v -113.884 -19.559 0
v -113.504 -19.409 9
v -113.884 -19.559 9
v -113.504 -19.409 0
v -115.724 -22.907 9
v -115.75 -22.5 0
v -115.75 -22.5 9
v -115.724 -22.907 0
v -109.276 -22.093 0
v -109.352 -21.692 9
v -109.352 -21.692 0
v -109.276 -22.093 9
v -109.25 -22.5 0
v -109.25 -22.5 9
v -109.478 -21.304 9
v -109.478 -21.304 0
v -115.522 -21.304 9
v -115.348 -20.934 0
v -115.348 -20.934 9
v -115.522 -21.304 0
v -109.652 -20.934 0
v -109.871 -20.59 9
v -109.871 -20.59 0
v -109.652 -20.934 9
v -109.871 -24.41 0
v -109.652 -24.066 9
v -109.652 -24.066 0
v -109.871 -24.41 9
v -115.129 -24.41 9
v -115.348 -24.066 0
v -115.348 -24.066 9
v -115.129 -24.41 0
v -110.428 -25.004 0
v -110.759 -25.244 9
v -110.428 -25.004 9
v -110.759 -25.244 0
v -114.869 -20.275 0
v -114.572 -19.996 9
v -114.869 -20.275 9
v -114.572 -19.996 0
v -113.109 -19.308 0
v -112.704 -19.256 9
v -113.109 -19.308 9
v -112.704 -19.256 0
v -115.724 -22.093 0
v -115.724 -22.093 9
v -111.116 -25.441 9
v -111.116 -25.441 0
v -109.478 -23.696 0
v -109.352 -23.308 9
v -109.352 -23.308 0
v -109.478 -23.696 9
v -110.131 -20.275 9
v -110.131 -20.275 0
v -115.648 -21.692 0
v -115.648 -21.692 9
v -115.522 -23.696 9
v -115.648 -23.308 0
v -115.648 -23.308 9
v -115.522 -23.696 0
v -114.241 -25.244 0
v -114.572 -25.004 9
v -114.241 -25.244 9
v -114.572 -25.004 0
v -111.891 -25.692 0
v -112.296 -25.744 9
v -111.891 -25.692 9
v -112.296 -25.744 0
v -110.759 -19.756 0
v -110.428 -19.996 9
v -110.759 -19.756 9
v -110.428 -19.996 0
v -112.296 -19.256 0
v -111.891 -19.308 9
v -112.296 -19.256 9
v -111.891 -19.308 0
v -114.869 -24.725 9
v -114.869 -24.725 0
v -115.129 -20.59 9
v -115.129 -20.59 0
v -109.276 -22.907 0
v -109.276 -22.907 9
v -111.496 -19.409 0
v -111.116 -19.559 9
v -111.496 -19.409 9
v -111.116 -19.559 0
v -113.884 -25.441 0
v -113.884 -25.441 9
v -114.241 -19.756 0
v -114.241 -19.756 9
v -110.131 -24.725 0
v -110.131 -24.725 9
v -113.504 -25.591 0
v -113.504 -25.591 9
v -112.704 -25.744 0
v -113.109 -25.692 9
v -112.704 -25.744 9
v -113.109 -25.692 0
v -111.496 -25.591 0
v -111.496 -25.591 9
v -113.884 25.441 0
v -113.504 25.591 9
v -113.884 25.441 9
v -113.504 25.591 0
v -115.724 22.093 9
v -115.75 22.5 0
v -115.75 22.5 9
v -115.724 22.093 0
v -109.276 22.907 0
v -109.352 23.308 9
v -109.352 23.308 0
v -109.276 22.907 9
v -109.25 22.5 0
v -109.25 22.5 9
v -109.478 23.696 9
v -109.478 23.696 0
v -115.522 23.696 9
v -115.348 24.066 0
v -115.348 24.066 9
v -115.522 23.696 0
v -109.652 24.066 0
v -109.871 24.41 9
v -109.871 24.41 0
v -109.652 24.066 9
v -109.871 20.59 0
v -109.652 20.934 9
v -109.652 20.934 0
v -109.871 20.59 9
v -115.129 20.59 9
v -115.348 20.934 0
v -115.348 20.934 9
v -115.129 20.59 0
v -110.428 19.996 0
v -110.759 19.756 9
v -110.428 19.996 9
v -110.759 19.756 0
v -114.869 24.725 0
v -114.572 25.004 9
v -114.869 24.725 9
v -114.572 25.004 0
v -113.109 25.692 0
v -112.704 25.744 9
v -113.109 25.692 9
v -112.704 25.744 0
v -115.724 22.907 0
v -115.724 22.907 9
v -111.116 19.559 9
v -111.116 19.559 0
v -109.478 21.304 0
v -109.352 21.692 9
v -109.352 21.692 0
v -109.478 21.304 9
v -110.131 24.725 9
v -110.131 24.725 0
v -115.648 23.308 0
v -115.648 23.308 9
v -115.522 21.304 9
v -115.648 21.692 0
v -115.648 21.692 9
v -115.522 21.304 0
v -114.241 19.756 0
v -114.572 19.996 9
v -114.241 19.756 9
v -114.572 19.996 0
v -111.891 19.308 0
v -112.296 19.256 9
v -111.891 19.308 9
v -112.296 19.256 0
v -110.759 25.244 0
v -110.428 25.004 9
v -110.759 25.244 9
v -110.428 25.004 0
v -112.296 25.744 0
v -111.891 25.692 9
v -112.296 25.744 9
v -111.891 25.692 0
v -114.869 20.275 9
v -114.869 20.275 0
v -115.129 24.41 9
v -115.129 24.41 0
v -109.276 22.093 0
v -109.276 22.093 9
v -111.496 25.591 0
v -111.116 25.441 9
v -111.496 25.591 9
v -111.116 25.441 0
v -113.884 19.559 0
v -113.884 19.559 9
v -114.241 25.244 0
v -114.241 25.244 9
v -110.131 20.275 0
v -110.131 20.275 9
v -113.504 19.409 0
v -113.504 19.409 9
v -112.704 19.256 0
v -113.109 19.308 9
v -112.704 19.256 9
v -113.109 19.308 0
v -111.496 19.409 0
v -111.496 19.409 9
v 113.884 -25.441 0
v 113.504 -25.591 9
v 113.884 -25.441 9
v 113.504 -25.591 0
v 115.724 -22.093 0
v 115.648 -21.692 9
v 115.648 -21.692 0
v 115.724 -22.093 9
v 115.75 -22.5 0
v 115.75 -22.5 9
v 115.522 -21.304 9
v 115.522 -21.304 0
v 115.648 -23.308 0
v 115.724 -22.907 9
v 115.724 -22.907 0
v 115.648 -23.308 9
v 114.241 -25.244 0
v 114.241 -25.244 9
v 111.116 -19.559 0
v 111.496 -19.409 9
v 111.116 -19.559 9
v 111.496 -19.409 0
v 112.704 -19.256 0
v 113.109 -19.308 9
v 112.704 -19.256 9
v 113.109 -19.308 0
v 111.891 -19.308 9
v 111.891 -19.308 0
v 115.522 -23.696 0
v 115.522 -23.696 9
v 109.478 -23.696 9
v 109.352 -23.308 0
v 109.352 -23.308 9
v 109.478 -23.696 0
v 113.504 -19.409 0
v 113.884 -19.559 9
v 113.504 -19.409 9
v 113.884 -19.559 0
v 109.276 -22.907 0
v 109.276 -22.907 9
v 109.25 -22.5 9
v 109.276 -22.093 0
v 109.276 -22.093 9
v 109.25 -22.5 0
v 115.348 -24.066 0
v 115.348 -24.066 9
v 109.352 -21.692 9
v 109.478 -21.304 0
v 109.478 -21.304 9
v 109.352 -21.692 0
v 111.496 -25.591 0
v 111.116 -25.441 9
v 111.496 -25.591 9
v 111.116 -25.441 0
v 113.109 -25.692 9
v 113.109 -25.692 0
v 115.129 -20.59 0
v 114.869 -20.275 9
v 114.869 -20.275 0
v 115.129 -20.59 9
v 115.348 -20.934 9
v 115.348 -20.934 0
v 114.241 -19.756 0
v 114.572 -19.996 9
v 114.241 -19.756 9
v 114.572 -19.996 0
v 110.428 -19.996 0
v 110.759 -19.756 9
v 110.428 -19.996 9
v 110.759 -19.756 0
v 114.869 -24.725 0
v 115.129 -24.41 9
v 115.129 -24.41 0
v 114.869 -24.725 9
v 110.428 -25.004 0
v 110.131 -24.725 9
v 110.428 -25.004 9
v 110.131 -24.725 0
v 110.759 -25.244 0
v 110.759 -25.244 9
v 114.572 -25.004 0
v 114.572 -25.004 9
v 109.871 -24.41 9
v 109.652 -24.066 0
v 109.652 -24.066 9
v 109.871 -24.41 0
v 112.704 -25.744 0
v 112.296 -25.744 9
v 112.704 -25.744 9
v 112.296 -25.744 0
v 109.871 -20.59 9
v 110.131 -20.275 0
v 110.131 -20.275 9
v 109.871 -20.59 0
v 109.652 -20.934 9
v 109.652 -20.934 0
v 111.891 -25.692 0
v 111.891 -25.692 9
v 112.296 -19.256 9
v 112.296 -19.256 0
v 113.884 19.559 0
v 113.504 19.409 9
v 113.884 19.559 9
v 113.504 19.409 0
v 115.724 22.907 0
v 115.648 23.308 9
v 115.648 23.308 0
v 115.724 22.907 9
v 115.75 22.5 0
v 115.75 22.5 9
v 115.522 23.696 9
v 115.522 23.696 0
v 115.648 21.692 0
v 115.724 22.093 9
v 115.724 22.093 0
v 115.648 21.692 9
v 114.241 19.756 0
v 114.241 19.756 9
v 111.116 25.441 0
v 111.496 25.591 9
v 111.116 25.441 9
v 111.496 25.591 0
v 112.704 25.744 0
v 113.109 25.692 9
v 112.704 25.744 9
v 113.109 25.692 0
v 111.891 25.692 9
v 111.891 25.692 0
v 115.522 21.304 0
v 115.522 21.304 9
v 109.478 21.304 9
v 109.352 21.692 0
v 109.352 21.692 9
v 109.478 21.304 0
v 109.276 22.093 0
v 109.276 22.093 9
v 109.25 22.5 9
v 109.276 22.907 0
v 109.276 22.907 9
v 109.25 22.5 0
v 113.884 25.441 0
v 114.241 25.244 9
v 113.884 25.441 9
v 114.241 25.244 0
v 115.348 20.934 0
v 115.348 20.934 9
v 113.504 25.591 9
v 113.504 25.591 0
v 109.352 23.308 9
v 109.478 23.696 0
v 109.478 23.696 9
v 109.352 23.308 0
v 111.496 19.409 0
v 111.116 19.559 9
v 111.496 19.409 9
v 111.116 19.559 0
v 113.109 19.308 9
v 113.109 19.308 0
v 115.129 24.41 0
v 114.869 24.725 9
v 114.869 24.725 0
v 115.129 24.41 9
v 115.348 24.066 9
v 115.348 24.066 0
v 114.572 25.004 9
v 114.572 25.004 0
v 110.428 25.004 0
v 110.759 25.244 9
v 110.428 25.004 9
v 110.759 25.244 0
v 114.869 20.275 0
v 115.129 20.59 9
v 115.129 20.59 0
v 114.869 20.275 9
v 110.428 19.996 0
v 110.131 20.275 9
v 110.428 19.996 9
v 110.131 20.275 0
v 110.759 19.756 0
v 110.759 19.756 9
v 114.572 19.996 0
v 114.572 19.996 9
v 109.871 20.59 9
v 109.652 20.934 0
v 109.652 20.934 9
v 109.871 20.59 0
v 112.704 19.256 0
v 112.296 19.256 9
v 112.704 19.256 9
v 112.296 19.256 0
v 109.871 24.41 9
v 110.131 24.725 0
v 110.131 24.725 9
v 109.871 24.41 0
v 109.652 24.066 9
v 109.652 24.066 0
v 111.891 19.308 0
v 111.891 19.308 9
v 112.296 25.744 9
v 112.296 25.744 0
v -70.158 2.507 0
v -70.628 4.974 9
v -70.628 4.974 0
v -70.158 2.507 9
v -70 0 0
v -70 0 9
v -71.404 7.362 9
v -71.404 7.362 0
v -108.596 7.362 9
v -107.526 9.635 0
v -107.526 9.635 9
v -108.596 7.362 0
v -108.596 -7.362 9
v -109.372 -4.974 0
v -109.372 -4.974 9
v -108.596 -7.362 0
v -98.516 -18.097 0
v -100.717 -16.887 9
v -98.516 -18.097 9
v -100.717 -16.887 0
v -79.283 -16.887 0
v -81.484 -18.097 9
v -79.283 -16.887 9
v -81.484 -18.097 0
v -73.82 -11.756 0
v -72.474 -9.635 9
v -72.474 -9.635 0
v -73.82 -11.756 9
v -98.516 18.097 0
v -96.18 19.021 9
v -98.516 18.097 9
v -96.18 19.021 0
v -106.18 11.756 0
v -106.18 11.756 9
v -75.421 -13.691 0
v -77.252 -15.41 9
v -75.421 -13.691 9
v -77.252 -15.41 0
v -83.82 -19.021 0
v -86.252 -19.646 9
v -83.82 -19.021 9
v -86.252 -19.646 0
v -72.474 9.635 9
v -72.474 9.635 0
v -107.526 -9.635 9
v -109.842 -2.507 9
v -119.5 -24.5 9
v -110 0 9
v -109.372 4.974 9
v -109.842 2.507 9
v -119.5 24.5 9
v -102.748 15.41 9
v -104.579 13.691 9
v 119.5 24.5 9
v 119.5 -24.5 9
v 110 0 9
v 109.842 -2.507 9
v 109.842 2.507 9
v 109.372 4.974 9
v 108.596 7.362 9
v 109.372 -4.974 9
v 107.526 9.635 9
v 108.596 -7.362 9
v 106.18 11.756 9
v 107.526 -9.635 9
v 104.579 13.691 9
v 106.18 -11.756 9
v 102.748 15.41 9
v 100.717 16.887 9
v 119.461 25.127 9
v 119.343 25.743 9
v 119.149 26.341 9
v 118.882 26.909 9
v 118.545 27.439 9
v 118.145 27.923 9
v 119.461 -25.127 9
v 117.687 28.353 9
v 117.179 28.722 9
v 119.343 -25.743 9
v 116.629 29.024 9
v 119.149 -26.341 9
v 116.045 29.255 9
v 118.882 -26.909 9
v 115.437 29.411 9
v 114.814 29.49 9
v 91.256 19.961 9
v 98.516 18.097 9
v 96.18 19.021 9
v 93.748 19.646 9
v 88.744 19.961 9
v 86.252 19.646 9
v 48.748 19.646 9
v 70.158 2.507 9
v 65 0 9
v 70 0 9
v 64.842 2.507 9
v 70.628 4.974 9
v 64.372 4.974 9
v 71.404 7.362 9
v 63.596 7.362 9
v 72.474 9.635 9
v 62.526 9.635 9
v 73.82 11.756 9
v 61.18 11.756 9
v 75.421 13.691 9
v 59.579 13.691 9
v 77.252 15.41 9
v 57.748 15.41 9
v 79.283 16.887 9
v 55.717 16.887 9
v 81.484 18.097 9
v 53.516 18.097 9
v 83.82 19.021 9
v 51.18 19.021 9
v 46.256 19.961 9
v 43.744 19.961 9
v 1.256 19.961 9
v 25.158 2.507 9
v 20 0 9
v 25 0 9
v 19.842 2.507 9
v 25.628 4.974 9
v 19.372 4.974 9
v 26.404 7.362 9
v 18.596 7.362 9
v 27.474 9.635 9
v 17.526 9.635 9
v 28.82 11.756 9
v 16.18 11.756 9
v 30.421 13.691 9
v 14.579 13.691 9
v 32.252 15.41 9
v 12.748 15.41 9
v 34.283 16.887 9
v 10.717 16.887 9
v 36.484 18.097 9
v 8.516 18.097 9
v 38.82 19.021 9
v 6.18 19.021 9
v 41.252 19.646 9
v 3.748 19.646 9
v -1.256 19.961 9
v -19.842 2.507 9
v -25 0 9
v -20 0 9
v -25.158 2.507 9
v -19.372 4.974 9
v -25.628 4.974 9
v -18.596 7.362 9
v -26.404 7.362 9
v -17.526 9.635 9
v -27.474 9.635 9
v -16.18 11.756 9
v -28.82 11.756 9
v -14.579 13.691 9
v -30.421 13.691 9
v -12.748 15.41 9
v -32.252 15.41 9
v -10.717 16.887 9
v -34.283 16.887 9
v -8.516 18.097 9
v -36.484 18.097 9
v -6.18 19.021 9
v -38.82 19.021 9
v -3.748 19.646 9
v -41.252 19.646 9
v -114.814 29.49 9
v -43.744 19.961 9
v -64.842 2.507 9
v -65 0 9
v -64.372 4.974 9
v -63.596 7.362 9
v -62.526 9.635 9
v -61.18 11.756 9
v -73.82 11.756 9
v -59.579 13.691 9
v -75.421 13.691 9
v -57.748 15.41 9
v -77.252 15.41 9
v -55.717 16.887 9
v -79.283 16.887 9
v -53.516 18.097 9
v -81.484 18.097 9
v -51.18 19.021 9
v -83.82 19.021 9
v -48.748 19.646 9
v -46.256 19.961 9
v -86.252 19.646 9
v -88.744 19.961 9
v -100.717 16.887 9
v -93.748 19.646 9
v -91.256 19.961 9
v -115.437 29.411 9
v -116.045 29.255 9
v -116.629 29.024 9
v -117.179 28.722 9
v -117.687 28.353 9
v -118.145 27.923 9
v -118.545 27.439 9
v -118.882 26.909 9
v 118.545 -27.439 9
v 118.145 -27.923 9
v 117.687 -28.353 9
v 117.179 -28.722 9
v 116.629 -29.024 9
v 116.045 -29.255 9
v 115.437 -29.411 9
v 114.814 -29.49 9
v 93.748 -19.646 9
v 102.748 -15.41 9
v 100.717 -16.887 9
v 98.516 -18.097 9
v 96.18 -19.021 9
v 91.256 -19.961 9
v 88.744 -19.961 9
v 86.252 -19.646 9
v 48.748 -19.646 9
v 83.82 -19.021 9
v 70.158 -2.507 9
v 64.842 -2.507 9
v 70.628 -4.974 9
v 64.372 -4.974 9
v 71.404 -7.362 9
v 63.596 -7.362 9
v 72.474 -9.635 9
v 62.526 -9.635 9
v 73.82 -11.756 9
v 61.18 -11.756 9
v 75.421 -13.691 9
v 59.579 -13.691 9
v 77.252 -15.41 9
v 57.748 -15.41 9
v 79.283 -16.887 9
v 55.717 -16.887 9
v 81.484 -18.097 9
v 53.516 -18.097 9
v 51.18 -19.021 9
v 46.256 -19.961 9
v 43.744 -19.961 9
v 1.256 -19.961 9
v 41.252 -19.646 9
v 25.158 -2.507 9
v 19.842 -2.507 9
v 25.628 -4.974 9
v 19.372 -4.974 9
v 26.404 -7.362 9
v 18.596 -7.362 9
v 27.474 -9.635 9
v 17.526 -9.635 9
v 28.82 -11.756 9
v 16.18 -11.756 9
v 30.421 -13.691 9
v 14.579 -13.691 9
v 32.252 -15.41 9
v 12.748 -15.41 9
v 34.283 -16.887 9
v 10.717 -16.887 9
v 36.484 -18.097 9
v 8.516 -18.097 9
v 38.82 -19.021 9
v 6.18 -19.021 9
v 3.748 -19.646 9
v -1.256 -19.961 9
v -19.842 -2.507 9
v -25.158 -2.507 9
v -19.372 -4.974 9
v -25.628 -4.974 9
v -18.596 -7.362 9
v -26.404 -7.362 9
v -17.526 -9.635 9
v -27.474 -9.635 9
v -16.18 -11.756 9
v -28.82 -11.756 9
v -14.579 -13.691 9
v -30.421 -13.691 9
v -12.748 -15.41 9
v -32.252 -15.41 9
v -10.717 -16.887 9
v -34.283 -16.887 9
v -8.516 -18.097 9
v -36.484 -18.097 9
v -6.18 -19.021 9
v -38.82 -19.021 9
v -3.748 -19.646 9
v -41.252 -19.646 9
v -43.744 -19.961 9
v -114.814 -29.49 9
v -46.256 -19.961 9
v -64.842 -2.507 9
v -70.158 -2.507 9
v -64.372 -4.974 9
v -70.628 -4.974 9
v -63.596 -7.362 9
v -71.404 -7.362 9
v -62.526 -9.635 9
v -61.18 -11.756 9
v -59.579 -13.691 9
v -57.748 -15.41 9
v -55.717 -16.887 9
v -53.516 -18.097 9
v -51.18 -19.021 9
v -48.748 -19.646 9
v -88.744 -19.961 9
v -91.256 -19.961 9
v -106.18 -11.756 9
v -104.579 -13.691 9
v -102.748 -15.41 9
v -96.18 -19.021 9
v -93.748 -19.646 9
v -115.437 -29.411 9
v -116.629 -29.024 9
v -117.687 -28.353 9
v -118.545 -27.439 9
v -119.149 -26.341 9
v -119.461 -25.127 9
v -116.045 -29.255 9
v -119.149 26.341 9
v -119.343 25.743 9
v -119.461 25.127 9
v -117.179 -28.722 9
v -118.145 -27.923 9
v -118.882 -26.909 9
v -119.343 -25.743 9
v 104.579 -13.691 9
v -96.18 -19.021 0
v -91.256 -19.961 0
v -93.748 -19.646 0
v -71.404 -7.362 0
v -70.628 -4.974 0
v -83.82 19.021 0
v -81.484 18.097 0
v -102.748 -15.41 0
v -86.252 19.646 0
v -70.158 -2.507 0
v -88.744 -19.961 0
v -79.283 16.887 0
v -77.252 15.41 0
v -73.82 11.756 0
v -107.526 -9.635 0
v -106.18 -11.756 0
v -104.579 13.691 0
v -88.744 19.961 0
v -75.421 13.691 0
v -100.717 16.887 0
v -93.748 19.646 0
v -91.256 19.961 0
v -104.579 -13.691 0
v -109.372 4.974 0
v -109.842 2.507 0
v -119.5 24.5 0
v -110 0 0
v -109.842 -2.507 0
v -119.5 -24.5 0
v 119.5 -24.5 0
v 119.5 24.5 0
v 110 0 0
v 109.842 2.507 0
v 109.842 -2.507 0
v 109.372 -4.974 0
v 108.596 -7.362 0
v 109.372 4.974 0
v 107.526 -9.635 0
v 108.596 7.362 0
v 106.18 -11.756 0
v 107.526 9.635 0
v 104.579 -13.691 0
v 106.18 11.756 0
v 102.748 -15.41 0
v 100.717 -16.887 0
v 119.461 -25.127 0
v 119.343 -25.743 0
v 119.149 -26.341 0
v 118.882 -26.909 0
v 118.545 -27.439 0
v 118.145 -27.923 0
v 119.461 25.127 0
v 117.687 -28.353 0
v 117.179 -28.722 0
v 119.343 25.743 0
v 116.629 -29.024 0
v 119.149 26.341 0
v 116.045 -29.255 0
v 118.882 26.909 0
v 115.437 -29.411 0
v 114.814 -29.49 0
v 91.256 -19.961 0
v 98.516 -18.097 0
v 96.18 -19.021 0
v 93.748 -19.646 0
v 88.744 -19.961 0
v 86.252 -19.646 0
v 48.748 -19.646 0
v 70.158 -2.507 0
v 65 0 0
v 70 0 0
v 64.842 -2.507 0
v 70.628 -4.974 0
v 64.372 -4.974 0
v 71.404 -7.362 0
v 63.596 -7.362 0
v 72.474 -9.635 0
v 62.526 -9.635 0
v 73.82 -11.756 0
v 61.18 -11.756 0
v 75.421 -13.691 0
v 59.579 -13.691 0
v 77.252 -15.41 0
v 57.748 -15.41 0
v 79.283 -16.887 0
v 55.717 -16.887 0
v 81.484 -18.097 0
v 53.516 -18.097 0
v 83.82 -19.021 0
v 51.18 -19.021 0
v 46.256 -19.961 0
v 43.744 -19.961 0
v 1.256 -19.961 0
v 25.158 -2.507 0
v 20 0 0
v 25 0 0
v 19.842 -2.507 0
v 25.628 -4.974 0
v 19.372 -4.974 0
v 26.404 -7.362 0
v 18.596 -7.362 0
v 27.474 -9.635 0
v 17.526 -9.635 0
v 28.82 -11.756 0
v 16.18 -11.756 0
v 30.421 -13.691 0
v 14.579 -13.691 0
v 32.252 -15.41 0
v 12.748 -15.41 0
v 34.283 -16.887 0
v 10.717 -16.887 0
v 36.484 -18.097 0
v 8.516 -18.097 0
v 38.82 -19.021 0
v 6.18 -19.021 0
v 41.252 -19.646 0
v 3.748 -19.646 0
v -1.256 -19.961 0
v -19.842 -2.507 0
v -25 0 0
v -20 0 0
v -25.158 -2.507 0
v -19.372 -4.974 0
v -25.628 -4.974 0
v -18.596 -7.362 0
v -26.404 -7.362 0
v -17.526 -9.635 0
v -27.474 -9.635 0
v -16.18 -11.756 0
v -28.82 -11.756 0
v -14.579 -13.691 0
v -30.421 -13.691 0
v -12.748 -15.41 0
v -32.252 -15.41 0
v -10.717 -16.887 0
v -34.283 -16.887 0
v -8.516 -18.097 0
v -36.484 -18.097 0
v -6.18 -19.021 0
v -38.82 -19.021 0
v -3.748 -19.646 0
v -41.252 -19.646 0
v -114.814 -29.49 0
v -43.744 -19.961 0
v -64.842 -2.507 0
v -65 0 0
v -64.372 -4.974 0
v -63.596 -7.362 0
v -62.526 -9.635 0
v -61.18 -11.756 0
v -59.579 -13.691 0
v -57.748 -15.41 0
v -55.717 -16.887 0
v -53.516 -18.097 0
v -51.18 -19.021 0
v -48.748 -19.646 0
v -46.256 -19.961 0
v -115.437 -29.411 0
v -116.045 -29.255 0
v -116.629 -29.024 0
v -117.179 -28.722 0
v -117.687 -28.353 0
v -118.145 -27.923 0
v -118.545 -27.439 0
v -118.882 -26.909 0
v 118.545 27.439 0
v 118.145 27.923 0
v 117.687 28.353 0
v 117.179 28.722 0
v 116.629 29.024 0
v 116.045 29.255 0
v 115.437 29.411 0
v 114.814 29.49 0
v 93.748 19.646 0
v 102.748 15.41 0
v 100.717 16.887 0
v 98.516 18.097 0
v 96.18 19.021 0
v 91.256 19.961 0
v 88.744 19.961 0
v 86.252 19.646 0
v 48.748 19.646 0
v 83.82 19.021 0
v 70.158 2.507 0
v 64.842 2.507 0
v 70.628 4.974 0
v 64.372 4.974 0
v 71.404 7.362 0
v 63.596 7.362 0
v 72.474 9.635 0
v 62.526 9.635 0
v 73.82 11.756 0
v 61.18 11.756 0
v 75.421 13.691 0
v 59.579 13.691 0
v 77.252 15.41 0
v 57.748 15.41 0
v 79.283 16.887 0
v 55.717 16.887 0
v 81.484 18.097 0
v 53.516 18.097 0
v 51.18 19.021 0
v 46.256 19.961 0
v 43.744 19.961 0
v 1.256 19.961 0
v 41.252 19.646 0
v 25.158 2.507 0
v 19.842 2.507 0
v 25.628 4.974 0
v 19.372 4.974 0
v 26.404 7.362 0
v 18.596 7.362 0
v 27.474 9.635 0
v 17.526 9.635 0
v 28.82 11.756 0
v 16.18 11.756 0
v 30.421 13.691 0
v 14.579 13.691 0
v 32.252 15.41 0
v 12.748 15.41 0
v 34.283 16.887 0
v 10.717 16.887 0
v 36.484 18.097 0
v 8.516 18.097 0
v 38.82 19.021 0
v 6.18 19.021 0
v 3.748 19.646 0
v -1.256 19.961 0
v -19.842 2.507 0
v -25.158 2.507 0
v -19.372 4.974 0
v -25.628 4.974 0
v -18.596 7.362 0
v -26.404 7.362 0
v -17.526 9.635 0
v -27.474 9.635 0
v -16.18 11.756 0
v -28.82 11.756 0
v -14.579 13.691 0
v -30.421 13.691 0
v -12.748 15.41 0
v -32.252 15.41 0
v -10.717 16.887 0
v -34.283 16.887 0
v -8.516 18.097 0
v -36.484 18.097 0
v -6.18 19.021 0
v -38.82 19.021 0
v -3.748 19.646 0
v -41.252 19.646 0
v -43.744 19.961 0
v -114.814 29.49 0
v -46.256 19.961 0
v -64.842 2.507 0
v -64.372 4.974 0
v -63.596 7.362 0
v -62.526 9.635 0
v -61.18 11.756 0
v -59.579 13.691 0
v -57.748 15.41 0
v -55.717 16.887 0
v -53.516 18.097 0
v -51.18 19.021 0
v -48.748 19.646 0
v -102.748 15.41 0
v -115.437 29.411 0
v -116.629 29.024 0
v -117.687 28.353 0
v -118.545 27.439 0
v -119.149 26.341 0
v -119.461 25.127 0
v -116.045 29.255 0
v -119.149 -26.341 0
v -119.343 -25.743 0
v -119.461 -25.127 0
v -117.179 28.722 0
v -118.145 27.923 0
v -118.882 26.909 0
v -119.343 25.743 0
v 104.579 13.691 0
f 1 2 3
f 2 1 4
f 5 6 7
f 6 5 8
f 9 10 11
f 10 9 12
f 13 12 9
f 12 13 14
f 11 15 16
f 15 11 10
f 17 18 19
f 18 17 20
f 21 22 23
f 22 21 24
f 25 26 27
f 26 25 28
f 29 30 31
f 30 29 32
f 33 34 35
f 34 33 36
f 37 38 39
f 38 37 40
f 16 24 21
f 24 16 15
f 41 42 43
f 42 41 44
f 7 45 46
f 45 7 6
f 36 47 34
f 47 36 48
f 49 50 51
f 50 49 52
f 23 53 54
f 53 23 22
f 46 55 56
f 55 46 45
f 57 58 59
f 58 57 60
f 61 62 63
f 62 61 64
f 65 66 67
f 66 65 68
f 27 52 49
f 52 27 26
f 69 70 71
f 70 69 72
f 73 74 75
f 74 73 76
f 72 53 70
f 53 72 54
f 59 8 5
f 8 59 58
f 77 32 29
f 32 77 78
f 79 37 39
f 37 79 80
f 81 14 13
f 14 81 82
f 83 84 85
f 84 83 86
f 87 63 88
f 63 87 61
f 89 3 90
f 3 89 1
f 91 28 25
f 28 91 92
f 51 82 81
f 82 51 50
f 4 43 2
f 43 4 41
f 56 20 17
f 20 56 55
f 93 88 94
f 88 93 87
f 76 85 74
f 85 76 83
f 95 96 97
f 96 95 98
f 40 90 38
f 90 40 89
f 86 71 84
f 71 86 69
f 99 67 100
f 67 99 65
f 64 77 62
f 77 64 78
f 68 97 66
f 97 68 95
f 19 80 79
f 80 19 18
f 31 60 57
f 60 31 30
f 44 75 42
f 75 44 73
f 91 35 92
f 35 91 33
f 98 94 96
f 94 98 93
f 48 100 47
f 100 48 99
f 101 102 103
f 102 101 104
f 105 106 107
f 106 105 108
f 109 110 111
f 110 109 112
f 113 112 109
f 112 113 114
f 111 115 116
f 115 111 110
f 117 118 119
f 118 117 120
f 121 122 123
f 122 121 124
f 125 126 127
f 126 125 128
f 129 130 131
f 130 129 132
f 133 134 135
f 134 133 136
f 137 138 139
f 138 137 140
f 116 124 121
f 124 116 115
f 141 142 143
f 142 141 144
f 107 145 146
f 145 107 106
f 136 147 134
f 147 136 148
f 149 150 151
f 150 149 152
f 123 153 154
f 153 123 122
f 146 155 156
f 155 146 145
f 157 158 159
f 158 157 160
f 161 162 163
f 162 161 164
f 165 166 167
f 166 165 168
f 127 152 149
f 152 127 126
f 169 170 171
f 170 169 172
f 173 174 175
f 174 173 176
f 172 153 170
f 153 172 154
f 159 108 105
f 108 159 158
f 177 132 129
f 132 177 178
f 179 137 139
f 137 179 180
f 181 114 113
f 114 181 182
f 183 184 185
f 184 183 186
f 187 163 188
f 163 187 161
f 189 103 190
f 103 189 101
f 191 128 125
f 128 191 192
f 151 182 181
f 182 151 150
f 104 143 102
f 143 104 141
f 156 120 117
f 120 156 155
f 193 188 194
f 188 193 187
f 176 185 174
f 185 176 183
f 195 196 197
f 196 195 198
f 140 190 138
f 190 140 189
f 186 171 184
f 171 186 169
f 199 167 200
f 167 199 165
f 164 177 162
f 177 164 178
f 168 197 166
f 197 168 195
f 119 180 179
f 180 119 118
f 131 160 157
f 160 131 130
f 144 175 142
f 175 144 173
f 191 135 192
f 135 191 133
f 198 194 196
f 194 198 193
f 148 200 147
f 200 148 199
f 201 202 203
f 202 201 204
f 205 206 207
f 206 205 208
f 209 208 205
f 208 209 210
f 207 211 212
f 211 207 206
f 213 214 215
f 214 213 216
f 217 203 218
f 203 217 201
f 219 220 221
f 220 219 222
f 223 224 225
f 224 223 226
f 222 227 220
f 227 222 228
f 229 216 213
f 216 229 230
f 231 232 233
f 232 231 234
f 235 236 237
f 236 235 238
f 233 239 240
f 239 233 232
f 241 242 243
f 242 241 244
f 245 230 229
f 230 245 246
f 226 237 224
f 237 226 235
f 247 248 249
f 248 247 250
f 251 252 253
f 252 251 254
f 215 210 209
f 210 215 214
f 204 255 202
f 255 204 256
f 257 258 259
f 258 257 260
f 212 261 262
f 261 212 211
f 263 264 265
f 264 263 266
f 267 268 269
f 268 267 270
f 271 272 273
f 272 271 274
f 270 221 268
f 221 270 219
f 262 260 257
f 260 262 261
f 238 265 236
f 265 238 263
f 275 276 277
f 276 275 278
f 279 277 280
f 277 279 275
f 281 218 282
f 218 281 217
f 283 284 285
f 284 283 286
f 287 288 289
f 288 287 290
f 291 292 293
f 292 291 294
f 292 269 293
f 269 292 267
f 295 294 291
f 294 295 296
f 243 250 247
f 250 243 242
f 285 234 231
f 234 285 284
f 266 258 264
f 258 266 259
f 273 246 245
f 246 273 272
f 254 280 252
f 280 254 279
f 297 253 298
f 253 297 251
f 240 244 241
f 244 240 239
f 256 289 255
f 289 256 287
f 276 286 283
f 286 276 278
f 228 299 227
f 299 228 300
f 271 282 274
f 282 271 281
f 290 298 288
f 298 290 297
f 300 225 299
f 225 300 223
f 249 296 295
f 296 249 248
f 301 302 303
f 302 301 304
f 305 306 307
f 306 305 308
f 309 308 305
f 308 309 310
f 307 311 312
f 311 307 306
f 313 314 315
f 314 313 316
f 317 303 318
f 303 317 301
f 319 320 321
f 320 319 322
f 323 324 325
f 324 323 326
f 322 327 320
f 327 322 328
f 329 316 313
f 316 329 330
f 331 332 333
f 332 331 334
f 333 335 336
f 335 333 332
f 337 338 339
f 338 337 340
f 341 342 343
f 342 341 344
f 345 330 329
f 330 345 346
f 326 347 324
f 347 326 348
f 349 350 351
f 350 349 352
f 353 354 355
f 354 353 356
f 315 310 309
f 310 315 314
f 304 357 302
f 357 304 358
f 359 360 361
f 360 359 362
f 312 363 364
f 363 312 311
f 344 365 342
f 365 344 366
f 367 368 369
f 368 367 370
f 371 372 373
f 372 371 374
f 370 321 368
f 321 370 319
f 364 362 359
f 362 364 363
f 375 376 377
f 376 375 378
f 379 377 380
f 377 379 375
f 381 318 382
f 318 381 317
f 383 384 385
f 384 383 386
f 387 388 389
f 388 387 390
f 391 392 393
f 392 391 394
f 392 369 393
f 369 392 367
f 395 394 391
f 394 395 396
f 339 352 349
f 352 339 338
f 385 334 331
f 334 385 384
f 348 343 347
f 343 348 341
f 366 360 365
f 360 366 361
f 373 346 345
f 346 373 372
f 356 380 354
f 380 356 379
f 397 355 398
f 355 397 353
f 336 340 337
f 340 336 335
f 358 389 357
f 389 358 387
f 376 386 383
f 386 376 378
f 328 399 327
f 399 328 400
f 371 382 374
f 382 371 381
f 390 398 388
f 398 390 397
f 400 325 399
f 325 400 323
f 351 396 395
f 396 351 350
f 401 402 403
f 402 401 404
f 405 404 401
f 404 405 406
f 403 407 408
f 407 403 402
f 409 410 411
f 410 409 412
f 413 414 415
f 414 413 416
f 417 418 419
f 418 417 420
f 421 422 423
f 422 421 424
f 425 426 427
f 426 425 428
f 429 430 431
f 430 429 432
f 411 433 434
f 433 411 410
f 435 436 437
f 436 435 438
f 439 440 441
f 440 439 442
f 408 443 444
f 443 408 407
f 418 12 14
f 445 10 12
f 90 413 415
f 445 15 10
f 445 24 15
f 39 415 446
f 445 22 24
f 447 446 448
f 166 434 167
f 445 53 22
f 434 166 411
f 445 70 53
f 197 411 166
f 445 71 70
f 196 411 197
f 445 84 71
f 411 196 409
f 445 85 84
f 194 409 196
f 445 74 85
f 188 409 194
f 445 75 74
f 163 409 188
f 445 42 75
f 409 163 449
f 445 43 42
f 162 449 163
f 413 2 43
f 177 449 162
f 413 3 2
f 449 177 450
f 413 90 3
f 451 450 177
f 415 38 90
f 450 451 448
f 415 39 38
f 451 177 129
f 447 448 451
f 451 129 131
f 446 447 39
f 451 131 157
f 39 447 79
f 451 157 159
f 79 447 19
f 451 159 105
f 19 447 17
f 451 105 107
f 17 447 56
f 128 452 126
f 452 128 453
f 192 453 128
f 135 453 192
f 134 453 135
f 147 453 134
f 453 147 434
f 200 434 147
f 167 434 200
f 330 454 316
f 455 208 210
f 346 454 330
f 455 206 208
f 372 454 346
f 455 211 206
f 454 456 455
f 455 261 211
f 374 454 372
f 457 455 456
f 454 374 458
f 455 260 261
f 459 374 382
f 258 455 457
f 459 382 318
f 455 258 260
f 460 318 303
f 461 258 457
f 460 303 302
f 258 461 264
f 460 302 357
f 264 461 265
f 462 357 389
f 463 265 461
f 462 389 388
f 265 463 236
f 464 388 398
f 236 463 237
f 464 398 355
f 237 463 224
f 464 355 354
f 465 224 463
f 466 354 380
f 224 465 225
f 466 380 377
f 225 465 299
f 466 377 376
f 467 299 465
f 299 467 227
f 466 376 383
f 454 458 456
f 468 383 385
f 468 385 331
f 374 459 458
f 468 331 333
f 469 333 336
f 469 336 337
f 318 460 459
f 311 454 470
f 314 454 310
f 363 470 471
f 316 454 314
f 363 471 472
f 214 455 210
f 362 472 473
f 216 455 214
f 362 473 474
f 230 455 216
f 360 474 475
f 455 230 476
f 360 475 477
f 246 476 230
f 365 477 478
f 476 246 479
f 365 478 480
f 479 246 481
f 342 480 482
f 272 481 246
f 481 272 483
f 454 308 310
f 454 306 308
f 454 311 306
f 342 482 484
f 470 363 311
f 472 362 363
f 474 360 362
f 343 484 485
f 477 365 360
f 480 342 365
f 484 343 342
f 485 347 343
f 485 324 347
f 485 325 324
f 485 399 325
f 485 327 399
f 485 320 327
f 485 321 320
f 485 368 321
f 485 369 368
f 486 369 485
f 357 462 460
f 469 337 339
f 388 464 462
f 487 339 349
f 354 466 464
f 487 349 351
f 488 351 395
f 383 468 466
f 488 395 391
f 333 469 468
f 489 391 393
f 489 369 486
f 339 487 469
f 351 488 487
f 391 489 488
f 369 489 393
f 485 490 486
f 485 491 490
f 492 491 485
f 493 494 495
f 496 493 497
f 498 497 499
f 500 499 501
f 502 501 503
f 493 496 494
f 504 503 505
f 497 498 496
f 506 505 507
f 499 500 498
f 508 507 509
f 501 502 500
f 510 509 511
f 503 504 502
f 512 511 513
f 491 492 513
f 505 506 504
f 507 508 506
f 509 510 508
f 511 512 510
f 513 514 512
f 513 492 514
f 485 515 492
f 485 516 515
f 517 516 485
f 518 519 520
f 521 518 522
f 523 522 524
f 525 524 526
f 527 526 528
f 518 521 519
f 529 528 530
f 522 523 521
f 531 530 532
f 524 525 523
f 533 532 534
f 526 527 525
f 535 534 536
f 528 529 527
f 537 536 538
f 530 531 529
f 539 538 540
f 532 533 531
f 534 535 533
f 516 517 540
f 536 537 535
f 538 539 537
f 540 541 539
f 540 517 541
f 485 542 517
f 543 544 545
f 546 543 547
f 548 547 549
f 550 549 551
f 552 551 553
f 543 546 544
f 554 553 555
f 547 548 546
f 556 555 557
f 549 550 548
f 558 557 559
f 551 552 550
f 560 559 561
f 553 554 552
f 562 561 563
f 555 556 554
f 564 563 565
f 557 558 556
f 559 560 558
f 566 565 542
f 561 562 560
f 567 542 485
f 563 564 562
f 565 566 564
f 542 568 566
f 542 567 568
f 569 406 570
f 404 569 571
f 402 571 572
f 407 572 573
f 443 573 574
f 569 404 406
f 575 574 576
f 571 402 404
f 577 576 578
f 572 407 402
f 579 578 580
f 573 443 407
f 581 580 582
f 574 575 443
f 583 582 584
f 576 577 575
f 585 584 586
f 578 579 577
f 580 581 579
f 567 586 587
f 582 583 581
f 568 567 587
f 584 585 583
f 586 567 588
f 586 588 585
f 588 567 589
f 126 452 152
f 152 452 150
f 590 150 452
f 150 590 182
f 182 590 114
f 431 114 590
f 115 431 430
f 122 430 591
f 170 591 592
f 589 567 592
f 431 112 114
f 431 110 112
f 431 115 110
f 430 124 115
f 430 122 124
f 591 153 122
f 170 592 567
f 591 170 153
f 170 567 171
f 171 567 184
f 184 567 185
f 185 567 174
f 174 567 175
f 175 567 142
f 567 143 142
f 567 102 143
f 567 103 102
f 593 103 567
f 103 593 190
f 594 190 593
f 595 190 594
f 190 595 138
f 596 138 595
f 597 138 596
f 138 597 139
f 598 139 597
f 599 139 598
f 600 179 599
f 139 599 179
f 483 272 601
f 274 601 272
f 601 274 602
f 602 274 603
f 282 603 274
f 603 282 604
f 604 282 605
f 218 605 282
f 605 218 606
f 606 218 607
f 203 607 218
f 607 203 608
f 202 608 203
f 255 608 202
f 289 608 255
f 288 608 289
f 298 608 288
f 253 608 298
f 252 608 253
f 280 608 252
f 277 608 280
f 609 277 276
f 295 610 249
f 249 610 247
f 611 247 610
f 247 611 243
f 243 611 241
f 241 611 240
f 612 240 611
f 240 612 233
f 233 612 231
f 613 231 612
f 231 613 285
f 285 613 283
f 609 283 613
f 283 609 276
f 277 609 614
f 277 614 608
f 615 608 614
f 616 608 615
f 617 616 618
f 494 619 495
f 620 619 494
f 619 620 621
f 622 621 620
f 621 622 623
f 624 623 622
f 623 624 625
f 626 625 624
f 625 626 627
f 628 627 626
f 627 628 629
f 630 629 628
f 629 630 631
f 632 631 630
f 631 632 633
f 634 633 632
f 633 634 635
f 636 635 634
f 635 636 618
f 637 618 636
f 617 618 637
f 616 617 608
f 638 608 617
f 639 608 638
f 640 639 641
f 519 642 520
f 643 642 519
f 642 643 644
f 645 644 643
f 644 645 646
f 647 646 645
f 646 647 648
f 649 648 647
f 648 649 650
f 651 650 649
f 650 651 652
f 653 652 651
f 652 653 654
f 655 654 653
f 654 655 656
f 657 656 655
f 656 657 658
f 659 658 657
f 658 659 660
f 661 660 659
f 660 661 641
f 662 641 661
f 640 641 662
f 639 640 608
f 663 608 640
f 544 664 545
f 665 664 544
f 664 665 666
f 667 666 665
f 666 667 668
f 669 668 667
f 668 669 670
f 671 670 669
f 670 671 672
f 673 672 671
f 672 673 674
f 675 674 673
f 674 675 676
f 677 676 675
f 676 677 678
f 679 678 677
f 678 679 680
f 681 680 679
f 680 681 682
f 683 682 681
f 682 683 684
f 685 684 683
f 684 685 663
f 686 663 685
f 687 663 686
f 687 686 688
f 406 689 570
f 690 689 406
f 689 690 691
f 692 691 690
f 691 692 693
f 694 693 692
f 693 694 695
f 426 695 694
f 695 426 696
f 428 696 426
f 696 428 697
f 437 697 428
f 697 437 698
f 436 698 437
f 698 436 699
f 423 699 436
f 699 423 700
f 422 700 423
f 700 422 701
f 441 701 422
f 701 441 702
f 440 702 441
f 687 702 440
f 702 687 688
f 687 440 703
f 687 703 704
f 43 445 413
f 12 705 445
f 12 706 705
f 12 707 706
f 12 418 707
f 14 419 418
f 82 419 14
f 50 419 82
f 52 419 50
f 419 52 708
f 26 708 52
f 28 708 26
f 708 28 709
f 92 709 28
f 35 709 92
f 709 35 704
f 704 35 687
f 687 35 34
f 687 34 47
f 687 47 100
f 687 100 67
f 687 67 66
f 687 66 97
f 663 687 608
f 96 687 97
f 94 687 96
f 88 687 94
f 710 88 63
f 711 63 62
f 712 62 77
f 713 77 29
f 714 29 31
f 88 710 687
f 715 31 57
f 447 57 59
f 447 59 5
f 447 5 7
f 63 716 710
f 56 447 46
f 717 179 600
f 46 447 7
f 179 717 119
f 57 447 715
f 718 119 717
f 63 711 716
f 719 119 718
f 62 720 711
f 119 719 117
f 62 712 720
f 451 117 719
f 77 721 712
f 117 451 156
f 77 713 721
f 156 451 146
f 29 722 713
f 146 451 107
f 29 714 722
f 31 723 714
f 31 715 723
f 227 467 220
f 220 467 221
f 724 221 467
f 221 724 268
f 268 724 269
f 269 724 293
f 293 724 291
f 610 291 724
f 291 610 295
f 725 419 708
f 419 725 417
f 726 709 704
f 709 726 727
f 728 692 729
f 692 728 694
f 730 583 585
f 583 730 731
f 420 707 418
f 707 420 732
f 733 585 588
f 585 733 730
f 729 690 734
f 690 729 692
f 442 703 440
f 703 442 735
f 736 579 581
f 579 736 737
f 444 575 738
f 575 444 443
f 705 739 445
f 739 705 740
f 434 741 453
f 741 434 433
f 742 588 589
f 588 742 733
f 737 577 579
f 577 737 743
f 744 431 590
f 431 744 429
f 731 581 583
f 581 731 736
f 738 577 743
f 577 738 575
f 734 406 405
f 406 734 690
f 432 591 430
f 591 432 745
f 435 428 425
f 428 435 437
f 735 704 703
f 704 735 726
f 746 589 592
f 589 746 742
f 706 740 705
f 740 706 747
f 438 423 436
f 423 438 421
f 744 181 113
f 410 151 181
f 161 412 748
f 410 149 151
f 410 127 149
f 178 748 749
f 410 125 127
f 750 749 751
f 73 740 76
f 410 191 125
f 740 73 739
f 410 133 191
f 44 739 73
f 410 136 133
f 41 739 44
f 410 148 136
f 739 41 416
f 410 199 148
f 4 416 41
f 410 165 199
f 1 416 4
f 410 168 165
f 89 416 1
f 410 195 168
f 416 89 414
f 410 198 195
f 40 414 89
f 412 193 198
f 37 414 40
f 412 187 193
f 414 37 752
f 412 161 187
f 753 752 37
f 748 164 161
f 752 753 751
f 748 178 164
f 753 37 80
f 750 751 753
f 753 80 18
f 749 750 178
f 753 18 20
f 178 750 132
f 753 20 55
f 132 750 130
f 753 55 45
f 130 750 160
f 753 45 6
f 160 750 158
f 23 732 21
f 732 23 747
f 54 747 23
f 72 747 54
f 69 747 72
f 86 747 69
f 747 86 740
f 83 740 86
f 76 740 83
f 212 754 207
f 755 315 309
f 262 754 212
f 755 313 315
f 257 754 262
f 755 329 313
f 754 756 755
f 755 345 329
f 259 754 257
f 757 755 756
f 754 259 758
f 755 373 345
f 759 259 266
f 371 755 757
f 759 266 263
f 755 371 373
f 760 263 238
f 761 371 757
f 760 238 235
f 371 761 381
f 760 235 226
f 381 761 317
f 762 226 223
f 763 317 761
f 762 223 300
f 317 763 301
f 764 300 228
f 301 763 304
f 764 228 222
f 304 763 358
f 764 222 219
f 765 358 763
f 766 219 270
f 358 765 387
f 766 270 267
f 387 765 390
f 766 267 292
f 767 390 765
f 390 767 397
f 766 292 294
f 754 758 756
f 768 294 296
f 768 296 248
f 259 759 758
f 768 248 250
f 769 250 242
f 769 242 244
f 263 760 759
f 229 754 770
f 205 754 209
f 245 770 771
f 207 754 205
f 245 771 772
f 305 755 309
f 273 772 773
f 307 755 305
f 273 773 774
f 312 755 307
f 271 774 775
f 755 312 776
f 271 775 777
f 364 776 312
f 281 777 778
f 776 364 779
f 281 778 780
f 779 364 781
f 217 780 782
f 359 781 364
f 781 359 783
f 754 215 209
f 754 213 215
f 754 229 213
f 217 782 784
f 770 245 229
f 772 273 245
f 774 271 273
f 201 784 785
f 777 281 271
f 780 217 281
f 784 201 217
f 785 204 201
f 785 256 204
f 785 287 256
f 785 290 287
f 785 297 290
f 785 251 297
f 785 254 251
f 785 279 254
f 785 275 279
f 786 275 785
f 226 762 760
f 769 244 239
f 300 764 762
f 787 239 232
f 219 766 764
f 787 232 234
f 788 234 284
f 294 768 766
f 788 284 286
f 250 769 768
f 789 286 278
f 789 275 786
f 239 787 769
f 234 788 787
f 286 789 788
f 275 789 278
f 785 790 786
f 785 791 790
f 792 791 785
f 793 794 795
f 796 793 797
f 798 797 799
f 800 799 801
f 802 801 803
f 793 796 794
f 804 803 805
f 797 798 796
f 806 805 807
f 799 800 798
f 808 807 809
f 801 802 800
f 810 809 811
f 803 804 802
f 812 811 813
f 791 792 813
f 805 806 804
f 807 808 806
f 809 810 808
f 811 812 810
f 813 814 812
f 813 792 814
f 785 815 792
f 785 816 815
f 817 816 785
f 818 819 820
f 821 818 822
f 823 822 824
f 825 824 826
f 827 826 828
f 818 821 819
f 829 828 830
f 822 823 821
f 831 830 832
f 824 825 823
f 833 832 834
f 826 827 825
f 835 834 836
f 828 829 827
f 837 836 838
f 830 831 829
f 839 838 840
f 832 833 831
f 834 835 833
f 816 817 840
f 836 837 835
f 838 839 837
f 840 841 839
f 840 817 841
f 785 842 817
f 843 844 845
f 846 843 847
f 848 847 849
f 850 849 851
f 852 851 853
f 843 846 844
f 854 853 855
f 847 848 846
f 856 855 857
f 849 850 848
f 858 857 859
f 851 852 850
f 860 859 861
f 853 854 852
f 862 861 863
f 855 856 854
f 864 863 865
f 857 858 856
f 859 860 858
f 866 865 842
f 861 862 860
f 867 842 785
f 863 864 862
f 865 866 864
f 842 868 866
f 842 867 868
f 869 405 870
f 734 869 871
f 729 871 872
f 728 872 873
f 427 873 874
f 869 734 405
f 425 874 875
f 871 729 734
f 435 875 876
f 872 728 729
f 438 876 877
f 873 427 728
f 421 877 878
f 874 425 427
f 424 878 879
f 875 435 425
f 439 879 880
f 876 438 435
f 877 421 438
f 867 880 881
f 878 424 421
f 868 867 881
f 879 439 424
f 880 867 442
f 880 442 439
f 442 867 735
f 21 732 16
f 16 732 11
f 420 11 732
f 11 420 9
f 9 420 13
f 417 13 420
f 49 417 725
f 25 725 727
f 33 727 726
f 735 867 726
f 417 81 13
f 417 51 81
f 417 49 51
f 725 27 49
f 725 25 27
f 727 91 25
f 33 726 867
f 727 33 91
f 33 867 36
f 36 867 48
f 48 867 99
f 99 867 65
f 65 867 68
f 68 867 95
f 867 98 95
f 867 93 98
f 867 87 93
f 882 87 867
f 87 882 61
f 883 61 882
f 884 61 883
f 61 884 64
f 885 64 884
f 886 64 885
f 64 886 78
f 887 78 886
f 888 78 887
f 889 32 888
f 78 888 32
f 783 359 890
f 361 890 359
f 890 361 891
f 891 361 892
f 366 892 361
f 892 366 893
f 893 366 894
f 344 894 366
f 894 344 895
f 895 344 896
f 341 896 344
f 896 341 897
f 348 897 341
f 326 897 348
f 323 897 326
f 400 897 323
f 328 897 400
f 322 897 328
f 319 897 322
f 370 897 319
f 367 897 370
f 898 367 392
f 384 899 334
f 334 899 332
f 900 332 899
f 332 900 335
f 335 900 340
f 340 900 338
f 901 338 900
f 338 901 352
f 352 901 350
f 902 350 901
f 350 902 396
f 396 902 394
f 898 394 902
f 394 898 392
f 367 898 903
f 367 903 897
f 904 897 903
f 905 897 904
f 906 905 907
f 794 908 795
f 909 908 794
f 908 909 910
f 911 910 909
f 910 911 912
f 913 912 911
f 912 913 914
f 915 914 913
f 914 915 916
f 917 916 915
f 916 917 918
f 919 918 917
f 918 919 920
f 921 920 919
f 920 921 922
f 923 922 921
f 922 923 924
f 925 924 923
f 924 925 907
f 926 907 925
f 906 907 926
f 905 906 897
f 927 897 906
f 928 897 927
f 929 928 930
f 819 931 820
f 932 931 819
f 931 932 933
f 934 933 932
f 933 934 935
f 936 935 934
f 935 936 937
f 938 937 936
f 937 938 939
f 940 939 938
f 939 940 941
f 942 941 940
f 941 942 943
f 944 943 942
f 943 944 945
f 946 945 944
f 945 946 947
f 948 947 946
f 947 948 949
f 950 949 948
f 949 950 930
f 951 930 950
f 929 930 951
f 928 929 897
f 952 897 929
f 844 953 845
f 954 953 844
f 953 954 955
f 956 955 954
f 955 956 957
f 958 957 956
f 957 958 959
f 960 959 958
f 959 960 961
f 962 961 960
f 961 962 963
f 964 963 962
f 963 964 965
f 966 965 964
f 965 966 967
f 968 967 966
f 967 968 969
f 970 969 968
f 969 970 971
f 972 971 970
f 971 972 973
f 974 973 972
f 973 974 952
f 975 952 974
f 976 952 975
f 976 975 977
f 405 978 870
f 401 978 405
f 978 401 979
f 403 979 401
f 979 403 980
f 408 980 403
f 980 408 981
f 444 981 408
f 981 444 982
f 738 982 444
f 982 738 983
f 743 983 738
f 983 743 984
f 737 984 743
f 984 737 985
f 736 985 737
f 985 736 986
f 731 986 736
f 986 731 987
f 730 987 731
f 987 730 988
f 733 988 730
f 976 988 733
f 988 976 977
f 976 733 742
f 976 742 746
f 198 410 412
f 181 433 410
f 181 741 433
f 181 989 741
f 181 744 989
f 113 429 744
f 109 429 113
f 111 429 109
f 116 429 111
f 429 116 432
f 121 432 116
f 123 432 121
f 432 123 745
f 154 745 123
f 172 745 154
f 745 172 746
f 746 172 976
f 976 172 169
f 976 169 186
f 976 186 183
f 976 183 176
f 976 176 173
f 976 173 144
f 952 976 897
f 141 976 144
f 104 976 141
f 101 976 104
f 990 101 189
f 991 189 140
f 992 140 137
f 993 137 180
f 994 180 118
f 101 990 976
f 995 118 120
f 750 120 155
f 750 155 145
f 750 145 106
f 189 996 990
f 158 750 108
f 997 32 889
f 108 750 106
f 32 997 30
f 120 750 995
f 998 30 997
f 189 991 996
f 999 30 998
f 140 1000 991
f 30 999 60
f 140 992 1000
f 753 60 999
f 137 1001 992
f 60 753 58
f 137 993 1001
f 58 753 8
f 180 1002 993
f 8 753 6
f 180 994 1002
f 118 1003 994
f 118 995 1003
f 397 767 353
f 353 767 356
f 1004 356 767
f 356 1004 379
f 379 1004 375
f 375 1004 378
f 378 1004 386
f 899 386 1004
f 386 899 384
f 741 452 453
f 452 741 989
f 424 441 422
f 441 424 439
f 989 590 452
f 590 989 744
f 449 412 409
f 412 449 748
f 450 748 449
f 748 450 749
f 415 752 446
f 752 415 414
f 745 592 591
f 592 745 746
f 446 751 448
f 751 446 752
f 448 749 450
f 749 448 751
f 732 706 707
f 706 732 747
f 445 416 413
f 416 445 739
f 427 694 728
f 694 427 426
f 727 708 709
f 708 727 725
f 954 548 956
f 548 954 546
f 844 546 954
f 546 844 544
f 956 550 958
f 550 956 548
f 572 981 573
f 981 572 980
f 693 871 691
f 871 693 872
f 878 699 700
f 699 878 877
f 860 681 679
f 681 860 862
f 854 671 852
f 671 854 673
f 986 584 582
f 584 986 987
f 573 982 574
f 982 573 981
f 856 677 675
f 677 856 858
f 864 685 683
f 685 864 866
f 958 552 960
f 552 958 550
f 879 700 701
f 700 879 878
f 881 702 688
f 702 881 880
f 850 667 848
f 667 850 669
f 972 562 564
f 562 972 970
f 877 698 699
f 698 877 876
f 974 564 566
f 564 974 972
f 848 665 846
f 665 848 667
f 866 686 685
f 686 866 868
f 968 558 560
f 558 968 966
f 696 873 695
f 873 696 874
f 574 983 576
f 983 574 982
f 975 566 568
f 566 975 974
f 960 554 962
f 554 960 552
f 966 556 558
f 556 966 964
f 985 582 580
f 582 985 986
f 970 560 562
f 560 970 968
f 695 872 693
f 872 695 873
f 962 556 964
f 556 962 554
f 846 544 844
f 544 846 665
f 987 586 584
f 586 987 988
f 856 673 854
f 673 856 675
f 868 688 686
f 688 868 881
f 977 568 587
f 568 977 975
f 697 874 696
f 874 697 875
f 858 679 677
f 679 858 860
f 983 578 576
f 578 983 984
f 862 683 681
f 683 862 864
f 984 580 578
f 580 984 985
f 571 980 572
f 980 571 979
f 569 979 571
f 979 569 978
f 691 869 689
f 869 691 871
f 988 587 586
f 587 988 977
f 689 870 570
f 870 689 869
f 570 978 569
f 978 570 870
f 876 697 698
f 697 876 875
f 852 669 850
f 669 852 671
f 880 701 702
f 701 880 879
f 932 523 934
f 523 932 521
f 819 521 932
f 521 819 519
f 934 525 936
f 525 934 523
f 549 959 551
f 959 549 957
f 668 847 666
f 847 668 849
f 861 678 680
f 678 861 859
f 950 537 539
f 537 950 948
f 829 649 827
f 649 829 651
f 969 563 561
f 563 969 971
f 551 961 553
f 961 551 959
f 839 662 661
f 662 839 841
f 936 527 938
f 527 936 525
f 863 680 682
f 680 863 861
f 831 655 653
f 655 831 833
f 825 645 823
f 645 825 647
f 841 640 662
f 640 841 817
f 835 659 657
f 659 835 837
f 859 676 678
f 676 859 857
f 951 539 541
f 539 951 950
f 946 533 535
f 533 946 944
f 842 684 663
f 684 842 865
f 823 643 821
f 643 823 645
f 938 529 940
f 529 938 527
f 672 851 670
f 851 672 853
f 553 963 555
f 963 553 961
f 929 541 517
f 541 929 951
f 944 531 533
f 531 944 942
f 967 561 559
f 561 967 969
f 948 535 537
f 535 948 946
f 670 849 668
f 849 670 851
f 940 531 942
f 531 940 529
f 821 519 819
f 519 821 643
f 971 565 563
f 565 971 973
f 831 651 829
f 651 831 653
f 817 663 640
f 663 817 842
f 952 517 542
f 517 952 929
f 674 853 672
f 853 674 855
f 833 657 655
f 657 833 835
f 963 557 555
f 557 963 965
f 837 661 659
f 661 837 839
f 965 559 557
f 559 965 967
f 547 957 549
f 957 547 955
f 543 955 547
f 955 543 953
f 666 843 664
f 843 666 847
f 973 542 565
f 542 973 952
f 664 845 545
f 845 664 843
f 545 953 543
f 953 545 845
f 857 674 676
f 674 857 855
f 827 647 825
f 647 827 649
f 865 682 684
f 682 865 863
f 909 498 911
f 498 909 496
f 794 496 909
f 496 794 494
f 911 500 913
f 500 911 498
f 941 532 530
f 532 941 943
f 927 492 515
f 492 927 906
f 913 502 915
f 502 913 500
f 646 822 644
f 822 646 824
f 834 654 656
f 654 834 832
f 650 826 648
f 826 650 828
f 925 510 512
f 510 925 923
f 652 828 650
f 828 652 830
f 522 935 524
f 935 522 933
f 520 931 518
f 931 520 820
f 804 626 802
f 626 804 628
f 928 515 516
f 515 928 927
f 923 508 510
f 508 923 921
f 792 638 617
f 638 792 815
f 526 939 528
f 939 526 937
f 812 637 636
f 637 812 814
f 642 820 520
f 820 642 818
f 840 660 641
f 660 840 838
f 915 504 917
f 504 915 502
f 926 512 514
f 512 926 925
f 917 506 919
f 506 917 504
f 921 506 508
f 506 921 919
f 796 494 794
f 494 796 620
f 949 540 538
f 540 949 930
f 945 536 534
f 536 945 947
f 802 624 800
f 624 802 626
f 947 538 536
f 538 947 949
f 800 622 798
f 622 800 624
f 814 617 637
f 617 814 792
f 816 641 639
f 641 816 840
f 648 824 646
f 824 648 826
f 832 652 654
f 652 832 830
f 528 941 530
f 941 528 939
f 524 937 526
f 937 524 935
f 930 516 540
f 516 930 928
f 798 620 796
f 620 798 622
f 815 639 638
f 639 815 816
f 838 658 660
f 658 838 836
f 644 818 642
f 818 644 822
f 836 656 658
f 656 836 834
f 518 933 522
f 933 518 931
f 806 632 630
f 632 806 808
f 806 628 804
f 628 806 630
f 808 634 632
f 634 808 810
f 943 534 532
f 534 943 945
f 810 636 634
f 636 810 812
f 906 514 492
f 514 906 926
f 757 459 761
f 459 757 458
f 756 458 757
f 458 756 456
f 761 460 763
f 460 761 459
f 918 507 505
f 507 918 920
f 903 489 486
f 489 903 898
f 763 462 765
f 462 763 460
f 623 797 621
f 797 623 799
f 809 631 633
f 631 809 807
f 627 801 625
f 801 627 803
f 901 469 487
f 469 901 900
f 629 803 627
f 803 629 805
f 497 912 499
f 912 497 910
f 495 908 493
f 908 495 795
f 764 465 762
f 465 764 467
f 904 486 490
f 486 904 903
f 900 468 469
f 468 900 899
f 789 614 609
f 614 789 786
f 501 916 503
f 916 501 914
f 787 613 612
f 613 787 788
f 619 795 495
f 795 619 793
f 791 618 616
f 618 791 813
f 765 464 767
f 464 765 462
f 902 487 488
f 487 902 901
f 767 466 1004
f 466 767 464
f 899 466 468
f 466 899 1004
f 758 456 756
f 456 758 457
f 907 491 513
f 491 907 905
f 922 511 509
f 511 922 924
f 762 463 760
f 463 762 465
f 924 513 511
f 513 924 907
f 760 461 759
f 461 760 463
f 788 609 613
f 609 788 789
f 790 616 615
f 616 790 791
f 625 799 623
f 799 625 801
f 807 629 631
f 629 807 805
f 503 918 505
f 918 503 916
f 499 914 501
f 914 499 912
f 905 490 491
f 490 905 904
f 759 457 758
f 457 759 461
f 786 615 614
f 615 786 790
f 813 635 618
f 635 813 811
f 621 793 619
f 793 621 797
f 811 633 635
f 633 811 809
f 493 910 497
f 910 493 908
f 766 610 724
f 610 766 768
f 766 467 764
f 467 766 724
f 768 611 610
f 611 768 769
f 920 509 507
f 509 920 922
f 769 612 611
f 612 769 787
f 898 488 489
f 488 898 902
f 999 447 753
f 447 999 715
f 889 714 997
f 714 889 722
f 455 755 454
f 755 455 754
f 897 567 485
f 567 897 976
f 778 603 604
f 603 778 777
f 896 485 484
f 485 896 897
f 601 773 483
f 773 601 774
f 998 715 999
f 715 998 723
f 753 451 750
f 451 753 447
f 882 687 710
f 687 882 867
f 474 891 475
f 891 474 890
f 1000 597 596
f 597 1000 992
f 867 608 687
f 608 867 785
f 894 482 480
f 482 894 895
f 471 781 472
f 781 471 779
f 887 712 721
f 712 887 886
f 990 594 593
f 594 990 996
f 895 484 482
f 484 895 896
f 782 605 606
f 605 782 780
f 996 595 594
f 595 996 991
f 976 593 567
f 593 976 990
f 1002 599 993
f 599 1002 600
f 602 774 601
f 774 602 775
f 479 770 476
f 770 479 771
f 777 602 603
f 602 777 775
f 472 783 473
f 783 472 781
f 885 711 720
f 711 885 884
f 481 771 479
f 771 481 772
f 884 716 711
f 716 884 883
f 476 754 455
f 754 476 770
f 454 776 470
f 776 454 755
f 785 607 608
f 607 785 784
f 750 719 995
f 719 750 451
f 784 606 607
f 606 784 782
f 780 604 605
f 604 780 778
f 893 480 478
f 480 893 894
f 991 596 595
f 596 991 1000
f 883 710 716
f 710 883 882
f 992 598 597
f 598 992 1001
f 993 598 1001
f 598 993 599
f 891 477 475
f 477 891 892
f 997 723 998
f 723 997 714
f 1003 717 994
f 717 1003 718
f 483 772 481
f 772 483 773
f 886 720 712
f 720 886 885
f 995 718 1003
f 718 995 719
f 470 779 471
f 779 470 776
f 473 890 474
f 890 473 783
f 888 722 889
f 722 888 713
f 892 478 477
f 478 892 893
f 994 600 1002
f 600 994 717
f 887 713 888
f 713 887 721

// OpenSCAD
$fn = 50;


difference() {
	union() {
		hull() {
			translate(v = [-114.5000000000, 24.5000000000, 0]) {
				cylinder(h = 9, r = 5);
			}
			translate(v = [114.5000000000, 24.5000000000, 0]) {
				cylinder(h = 9, r = 5);
			}
			translate(v = [-114.5000000000, -24.5000000000, 0]) {
				cylinder(h = 9, r = 5);
			}
			translate(v = [114.5000000000, -24.5000000000, 0]) {
				cylinder(h = 9, r = 5);
			}
		}
	}
	union() {
		#translate(v = [-112.5000000000, -22.5000000000, -100.0000000000]) {
			cylinder(h = 200, r = 3.2500000000);
		}
		#translate(v = [-112.5000000000, 22.5000000000, -100.0000000000]) {
			cylinder(h = 200, r = 3.2500000000);
		}
		#translate(v = [112.5000000000, -22.5000000000, -100.0000000000]) {
			cylinder(h = 200, r = 3.2500000000);
		}
		#translate(v = [112.5000000000, 22.5000000000, -100.0000000000]) {
			cylinder(h = 200, r = 3.2500000000);
		}
		#translate(v = [-90.0000000000, 0, 0]) {
			cylinder(h = 9, r = 20.0000000000);
		}
		#translate(v = [-45.0000000000, 0, 0]) {
			cylinder(h = 9, r = 20.0000000000);
		}
		#cylinder(h = 9, r = 20.0000000000);
		#translate(v = [45.0000000000, 0, 0]) {
			cylinder(h = 9, r = 20.0000000000);
		}
		#translate(v = [90.0000000000, 0, 0]) {
			cylinder(h = 9, r = 20.0000000000);
		}
	}
}
